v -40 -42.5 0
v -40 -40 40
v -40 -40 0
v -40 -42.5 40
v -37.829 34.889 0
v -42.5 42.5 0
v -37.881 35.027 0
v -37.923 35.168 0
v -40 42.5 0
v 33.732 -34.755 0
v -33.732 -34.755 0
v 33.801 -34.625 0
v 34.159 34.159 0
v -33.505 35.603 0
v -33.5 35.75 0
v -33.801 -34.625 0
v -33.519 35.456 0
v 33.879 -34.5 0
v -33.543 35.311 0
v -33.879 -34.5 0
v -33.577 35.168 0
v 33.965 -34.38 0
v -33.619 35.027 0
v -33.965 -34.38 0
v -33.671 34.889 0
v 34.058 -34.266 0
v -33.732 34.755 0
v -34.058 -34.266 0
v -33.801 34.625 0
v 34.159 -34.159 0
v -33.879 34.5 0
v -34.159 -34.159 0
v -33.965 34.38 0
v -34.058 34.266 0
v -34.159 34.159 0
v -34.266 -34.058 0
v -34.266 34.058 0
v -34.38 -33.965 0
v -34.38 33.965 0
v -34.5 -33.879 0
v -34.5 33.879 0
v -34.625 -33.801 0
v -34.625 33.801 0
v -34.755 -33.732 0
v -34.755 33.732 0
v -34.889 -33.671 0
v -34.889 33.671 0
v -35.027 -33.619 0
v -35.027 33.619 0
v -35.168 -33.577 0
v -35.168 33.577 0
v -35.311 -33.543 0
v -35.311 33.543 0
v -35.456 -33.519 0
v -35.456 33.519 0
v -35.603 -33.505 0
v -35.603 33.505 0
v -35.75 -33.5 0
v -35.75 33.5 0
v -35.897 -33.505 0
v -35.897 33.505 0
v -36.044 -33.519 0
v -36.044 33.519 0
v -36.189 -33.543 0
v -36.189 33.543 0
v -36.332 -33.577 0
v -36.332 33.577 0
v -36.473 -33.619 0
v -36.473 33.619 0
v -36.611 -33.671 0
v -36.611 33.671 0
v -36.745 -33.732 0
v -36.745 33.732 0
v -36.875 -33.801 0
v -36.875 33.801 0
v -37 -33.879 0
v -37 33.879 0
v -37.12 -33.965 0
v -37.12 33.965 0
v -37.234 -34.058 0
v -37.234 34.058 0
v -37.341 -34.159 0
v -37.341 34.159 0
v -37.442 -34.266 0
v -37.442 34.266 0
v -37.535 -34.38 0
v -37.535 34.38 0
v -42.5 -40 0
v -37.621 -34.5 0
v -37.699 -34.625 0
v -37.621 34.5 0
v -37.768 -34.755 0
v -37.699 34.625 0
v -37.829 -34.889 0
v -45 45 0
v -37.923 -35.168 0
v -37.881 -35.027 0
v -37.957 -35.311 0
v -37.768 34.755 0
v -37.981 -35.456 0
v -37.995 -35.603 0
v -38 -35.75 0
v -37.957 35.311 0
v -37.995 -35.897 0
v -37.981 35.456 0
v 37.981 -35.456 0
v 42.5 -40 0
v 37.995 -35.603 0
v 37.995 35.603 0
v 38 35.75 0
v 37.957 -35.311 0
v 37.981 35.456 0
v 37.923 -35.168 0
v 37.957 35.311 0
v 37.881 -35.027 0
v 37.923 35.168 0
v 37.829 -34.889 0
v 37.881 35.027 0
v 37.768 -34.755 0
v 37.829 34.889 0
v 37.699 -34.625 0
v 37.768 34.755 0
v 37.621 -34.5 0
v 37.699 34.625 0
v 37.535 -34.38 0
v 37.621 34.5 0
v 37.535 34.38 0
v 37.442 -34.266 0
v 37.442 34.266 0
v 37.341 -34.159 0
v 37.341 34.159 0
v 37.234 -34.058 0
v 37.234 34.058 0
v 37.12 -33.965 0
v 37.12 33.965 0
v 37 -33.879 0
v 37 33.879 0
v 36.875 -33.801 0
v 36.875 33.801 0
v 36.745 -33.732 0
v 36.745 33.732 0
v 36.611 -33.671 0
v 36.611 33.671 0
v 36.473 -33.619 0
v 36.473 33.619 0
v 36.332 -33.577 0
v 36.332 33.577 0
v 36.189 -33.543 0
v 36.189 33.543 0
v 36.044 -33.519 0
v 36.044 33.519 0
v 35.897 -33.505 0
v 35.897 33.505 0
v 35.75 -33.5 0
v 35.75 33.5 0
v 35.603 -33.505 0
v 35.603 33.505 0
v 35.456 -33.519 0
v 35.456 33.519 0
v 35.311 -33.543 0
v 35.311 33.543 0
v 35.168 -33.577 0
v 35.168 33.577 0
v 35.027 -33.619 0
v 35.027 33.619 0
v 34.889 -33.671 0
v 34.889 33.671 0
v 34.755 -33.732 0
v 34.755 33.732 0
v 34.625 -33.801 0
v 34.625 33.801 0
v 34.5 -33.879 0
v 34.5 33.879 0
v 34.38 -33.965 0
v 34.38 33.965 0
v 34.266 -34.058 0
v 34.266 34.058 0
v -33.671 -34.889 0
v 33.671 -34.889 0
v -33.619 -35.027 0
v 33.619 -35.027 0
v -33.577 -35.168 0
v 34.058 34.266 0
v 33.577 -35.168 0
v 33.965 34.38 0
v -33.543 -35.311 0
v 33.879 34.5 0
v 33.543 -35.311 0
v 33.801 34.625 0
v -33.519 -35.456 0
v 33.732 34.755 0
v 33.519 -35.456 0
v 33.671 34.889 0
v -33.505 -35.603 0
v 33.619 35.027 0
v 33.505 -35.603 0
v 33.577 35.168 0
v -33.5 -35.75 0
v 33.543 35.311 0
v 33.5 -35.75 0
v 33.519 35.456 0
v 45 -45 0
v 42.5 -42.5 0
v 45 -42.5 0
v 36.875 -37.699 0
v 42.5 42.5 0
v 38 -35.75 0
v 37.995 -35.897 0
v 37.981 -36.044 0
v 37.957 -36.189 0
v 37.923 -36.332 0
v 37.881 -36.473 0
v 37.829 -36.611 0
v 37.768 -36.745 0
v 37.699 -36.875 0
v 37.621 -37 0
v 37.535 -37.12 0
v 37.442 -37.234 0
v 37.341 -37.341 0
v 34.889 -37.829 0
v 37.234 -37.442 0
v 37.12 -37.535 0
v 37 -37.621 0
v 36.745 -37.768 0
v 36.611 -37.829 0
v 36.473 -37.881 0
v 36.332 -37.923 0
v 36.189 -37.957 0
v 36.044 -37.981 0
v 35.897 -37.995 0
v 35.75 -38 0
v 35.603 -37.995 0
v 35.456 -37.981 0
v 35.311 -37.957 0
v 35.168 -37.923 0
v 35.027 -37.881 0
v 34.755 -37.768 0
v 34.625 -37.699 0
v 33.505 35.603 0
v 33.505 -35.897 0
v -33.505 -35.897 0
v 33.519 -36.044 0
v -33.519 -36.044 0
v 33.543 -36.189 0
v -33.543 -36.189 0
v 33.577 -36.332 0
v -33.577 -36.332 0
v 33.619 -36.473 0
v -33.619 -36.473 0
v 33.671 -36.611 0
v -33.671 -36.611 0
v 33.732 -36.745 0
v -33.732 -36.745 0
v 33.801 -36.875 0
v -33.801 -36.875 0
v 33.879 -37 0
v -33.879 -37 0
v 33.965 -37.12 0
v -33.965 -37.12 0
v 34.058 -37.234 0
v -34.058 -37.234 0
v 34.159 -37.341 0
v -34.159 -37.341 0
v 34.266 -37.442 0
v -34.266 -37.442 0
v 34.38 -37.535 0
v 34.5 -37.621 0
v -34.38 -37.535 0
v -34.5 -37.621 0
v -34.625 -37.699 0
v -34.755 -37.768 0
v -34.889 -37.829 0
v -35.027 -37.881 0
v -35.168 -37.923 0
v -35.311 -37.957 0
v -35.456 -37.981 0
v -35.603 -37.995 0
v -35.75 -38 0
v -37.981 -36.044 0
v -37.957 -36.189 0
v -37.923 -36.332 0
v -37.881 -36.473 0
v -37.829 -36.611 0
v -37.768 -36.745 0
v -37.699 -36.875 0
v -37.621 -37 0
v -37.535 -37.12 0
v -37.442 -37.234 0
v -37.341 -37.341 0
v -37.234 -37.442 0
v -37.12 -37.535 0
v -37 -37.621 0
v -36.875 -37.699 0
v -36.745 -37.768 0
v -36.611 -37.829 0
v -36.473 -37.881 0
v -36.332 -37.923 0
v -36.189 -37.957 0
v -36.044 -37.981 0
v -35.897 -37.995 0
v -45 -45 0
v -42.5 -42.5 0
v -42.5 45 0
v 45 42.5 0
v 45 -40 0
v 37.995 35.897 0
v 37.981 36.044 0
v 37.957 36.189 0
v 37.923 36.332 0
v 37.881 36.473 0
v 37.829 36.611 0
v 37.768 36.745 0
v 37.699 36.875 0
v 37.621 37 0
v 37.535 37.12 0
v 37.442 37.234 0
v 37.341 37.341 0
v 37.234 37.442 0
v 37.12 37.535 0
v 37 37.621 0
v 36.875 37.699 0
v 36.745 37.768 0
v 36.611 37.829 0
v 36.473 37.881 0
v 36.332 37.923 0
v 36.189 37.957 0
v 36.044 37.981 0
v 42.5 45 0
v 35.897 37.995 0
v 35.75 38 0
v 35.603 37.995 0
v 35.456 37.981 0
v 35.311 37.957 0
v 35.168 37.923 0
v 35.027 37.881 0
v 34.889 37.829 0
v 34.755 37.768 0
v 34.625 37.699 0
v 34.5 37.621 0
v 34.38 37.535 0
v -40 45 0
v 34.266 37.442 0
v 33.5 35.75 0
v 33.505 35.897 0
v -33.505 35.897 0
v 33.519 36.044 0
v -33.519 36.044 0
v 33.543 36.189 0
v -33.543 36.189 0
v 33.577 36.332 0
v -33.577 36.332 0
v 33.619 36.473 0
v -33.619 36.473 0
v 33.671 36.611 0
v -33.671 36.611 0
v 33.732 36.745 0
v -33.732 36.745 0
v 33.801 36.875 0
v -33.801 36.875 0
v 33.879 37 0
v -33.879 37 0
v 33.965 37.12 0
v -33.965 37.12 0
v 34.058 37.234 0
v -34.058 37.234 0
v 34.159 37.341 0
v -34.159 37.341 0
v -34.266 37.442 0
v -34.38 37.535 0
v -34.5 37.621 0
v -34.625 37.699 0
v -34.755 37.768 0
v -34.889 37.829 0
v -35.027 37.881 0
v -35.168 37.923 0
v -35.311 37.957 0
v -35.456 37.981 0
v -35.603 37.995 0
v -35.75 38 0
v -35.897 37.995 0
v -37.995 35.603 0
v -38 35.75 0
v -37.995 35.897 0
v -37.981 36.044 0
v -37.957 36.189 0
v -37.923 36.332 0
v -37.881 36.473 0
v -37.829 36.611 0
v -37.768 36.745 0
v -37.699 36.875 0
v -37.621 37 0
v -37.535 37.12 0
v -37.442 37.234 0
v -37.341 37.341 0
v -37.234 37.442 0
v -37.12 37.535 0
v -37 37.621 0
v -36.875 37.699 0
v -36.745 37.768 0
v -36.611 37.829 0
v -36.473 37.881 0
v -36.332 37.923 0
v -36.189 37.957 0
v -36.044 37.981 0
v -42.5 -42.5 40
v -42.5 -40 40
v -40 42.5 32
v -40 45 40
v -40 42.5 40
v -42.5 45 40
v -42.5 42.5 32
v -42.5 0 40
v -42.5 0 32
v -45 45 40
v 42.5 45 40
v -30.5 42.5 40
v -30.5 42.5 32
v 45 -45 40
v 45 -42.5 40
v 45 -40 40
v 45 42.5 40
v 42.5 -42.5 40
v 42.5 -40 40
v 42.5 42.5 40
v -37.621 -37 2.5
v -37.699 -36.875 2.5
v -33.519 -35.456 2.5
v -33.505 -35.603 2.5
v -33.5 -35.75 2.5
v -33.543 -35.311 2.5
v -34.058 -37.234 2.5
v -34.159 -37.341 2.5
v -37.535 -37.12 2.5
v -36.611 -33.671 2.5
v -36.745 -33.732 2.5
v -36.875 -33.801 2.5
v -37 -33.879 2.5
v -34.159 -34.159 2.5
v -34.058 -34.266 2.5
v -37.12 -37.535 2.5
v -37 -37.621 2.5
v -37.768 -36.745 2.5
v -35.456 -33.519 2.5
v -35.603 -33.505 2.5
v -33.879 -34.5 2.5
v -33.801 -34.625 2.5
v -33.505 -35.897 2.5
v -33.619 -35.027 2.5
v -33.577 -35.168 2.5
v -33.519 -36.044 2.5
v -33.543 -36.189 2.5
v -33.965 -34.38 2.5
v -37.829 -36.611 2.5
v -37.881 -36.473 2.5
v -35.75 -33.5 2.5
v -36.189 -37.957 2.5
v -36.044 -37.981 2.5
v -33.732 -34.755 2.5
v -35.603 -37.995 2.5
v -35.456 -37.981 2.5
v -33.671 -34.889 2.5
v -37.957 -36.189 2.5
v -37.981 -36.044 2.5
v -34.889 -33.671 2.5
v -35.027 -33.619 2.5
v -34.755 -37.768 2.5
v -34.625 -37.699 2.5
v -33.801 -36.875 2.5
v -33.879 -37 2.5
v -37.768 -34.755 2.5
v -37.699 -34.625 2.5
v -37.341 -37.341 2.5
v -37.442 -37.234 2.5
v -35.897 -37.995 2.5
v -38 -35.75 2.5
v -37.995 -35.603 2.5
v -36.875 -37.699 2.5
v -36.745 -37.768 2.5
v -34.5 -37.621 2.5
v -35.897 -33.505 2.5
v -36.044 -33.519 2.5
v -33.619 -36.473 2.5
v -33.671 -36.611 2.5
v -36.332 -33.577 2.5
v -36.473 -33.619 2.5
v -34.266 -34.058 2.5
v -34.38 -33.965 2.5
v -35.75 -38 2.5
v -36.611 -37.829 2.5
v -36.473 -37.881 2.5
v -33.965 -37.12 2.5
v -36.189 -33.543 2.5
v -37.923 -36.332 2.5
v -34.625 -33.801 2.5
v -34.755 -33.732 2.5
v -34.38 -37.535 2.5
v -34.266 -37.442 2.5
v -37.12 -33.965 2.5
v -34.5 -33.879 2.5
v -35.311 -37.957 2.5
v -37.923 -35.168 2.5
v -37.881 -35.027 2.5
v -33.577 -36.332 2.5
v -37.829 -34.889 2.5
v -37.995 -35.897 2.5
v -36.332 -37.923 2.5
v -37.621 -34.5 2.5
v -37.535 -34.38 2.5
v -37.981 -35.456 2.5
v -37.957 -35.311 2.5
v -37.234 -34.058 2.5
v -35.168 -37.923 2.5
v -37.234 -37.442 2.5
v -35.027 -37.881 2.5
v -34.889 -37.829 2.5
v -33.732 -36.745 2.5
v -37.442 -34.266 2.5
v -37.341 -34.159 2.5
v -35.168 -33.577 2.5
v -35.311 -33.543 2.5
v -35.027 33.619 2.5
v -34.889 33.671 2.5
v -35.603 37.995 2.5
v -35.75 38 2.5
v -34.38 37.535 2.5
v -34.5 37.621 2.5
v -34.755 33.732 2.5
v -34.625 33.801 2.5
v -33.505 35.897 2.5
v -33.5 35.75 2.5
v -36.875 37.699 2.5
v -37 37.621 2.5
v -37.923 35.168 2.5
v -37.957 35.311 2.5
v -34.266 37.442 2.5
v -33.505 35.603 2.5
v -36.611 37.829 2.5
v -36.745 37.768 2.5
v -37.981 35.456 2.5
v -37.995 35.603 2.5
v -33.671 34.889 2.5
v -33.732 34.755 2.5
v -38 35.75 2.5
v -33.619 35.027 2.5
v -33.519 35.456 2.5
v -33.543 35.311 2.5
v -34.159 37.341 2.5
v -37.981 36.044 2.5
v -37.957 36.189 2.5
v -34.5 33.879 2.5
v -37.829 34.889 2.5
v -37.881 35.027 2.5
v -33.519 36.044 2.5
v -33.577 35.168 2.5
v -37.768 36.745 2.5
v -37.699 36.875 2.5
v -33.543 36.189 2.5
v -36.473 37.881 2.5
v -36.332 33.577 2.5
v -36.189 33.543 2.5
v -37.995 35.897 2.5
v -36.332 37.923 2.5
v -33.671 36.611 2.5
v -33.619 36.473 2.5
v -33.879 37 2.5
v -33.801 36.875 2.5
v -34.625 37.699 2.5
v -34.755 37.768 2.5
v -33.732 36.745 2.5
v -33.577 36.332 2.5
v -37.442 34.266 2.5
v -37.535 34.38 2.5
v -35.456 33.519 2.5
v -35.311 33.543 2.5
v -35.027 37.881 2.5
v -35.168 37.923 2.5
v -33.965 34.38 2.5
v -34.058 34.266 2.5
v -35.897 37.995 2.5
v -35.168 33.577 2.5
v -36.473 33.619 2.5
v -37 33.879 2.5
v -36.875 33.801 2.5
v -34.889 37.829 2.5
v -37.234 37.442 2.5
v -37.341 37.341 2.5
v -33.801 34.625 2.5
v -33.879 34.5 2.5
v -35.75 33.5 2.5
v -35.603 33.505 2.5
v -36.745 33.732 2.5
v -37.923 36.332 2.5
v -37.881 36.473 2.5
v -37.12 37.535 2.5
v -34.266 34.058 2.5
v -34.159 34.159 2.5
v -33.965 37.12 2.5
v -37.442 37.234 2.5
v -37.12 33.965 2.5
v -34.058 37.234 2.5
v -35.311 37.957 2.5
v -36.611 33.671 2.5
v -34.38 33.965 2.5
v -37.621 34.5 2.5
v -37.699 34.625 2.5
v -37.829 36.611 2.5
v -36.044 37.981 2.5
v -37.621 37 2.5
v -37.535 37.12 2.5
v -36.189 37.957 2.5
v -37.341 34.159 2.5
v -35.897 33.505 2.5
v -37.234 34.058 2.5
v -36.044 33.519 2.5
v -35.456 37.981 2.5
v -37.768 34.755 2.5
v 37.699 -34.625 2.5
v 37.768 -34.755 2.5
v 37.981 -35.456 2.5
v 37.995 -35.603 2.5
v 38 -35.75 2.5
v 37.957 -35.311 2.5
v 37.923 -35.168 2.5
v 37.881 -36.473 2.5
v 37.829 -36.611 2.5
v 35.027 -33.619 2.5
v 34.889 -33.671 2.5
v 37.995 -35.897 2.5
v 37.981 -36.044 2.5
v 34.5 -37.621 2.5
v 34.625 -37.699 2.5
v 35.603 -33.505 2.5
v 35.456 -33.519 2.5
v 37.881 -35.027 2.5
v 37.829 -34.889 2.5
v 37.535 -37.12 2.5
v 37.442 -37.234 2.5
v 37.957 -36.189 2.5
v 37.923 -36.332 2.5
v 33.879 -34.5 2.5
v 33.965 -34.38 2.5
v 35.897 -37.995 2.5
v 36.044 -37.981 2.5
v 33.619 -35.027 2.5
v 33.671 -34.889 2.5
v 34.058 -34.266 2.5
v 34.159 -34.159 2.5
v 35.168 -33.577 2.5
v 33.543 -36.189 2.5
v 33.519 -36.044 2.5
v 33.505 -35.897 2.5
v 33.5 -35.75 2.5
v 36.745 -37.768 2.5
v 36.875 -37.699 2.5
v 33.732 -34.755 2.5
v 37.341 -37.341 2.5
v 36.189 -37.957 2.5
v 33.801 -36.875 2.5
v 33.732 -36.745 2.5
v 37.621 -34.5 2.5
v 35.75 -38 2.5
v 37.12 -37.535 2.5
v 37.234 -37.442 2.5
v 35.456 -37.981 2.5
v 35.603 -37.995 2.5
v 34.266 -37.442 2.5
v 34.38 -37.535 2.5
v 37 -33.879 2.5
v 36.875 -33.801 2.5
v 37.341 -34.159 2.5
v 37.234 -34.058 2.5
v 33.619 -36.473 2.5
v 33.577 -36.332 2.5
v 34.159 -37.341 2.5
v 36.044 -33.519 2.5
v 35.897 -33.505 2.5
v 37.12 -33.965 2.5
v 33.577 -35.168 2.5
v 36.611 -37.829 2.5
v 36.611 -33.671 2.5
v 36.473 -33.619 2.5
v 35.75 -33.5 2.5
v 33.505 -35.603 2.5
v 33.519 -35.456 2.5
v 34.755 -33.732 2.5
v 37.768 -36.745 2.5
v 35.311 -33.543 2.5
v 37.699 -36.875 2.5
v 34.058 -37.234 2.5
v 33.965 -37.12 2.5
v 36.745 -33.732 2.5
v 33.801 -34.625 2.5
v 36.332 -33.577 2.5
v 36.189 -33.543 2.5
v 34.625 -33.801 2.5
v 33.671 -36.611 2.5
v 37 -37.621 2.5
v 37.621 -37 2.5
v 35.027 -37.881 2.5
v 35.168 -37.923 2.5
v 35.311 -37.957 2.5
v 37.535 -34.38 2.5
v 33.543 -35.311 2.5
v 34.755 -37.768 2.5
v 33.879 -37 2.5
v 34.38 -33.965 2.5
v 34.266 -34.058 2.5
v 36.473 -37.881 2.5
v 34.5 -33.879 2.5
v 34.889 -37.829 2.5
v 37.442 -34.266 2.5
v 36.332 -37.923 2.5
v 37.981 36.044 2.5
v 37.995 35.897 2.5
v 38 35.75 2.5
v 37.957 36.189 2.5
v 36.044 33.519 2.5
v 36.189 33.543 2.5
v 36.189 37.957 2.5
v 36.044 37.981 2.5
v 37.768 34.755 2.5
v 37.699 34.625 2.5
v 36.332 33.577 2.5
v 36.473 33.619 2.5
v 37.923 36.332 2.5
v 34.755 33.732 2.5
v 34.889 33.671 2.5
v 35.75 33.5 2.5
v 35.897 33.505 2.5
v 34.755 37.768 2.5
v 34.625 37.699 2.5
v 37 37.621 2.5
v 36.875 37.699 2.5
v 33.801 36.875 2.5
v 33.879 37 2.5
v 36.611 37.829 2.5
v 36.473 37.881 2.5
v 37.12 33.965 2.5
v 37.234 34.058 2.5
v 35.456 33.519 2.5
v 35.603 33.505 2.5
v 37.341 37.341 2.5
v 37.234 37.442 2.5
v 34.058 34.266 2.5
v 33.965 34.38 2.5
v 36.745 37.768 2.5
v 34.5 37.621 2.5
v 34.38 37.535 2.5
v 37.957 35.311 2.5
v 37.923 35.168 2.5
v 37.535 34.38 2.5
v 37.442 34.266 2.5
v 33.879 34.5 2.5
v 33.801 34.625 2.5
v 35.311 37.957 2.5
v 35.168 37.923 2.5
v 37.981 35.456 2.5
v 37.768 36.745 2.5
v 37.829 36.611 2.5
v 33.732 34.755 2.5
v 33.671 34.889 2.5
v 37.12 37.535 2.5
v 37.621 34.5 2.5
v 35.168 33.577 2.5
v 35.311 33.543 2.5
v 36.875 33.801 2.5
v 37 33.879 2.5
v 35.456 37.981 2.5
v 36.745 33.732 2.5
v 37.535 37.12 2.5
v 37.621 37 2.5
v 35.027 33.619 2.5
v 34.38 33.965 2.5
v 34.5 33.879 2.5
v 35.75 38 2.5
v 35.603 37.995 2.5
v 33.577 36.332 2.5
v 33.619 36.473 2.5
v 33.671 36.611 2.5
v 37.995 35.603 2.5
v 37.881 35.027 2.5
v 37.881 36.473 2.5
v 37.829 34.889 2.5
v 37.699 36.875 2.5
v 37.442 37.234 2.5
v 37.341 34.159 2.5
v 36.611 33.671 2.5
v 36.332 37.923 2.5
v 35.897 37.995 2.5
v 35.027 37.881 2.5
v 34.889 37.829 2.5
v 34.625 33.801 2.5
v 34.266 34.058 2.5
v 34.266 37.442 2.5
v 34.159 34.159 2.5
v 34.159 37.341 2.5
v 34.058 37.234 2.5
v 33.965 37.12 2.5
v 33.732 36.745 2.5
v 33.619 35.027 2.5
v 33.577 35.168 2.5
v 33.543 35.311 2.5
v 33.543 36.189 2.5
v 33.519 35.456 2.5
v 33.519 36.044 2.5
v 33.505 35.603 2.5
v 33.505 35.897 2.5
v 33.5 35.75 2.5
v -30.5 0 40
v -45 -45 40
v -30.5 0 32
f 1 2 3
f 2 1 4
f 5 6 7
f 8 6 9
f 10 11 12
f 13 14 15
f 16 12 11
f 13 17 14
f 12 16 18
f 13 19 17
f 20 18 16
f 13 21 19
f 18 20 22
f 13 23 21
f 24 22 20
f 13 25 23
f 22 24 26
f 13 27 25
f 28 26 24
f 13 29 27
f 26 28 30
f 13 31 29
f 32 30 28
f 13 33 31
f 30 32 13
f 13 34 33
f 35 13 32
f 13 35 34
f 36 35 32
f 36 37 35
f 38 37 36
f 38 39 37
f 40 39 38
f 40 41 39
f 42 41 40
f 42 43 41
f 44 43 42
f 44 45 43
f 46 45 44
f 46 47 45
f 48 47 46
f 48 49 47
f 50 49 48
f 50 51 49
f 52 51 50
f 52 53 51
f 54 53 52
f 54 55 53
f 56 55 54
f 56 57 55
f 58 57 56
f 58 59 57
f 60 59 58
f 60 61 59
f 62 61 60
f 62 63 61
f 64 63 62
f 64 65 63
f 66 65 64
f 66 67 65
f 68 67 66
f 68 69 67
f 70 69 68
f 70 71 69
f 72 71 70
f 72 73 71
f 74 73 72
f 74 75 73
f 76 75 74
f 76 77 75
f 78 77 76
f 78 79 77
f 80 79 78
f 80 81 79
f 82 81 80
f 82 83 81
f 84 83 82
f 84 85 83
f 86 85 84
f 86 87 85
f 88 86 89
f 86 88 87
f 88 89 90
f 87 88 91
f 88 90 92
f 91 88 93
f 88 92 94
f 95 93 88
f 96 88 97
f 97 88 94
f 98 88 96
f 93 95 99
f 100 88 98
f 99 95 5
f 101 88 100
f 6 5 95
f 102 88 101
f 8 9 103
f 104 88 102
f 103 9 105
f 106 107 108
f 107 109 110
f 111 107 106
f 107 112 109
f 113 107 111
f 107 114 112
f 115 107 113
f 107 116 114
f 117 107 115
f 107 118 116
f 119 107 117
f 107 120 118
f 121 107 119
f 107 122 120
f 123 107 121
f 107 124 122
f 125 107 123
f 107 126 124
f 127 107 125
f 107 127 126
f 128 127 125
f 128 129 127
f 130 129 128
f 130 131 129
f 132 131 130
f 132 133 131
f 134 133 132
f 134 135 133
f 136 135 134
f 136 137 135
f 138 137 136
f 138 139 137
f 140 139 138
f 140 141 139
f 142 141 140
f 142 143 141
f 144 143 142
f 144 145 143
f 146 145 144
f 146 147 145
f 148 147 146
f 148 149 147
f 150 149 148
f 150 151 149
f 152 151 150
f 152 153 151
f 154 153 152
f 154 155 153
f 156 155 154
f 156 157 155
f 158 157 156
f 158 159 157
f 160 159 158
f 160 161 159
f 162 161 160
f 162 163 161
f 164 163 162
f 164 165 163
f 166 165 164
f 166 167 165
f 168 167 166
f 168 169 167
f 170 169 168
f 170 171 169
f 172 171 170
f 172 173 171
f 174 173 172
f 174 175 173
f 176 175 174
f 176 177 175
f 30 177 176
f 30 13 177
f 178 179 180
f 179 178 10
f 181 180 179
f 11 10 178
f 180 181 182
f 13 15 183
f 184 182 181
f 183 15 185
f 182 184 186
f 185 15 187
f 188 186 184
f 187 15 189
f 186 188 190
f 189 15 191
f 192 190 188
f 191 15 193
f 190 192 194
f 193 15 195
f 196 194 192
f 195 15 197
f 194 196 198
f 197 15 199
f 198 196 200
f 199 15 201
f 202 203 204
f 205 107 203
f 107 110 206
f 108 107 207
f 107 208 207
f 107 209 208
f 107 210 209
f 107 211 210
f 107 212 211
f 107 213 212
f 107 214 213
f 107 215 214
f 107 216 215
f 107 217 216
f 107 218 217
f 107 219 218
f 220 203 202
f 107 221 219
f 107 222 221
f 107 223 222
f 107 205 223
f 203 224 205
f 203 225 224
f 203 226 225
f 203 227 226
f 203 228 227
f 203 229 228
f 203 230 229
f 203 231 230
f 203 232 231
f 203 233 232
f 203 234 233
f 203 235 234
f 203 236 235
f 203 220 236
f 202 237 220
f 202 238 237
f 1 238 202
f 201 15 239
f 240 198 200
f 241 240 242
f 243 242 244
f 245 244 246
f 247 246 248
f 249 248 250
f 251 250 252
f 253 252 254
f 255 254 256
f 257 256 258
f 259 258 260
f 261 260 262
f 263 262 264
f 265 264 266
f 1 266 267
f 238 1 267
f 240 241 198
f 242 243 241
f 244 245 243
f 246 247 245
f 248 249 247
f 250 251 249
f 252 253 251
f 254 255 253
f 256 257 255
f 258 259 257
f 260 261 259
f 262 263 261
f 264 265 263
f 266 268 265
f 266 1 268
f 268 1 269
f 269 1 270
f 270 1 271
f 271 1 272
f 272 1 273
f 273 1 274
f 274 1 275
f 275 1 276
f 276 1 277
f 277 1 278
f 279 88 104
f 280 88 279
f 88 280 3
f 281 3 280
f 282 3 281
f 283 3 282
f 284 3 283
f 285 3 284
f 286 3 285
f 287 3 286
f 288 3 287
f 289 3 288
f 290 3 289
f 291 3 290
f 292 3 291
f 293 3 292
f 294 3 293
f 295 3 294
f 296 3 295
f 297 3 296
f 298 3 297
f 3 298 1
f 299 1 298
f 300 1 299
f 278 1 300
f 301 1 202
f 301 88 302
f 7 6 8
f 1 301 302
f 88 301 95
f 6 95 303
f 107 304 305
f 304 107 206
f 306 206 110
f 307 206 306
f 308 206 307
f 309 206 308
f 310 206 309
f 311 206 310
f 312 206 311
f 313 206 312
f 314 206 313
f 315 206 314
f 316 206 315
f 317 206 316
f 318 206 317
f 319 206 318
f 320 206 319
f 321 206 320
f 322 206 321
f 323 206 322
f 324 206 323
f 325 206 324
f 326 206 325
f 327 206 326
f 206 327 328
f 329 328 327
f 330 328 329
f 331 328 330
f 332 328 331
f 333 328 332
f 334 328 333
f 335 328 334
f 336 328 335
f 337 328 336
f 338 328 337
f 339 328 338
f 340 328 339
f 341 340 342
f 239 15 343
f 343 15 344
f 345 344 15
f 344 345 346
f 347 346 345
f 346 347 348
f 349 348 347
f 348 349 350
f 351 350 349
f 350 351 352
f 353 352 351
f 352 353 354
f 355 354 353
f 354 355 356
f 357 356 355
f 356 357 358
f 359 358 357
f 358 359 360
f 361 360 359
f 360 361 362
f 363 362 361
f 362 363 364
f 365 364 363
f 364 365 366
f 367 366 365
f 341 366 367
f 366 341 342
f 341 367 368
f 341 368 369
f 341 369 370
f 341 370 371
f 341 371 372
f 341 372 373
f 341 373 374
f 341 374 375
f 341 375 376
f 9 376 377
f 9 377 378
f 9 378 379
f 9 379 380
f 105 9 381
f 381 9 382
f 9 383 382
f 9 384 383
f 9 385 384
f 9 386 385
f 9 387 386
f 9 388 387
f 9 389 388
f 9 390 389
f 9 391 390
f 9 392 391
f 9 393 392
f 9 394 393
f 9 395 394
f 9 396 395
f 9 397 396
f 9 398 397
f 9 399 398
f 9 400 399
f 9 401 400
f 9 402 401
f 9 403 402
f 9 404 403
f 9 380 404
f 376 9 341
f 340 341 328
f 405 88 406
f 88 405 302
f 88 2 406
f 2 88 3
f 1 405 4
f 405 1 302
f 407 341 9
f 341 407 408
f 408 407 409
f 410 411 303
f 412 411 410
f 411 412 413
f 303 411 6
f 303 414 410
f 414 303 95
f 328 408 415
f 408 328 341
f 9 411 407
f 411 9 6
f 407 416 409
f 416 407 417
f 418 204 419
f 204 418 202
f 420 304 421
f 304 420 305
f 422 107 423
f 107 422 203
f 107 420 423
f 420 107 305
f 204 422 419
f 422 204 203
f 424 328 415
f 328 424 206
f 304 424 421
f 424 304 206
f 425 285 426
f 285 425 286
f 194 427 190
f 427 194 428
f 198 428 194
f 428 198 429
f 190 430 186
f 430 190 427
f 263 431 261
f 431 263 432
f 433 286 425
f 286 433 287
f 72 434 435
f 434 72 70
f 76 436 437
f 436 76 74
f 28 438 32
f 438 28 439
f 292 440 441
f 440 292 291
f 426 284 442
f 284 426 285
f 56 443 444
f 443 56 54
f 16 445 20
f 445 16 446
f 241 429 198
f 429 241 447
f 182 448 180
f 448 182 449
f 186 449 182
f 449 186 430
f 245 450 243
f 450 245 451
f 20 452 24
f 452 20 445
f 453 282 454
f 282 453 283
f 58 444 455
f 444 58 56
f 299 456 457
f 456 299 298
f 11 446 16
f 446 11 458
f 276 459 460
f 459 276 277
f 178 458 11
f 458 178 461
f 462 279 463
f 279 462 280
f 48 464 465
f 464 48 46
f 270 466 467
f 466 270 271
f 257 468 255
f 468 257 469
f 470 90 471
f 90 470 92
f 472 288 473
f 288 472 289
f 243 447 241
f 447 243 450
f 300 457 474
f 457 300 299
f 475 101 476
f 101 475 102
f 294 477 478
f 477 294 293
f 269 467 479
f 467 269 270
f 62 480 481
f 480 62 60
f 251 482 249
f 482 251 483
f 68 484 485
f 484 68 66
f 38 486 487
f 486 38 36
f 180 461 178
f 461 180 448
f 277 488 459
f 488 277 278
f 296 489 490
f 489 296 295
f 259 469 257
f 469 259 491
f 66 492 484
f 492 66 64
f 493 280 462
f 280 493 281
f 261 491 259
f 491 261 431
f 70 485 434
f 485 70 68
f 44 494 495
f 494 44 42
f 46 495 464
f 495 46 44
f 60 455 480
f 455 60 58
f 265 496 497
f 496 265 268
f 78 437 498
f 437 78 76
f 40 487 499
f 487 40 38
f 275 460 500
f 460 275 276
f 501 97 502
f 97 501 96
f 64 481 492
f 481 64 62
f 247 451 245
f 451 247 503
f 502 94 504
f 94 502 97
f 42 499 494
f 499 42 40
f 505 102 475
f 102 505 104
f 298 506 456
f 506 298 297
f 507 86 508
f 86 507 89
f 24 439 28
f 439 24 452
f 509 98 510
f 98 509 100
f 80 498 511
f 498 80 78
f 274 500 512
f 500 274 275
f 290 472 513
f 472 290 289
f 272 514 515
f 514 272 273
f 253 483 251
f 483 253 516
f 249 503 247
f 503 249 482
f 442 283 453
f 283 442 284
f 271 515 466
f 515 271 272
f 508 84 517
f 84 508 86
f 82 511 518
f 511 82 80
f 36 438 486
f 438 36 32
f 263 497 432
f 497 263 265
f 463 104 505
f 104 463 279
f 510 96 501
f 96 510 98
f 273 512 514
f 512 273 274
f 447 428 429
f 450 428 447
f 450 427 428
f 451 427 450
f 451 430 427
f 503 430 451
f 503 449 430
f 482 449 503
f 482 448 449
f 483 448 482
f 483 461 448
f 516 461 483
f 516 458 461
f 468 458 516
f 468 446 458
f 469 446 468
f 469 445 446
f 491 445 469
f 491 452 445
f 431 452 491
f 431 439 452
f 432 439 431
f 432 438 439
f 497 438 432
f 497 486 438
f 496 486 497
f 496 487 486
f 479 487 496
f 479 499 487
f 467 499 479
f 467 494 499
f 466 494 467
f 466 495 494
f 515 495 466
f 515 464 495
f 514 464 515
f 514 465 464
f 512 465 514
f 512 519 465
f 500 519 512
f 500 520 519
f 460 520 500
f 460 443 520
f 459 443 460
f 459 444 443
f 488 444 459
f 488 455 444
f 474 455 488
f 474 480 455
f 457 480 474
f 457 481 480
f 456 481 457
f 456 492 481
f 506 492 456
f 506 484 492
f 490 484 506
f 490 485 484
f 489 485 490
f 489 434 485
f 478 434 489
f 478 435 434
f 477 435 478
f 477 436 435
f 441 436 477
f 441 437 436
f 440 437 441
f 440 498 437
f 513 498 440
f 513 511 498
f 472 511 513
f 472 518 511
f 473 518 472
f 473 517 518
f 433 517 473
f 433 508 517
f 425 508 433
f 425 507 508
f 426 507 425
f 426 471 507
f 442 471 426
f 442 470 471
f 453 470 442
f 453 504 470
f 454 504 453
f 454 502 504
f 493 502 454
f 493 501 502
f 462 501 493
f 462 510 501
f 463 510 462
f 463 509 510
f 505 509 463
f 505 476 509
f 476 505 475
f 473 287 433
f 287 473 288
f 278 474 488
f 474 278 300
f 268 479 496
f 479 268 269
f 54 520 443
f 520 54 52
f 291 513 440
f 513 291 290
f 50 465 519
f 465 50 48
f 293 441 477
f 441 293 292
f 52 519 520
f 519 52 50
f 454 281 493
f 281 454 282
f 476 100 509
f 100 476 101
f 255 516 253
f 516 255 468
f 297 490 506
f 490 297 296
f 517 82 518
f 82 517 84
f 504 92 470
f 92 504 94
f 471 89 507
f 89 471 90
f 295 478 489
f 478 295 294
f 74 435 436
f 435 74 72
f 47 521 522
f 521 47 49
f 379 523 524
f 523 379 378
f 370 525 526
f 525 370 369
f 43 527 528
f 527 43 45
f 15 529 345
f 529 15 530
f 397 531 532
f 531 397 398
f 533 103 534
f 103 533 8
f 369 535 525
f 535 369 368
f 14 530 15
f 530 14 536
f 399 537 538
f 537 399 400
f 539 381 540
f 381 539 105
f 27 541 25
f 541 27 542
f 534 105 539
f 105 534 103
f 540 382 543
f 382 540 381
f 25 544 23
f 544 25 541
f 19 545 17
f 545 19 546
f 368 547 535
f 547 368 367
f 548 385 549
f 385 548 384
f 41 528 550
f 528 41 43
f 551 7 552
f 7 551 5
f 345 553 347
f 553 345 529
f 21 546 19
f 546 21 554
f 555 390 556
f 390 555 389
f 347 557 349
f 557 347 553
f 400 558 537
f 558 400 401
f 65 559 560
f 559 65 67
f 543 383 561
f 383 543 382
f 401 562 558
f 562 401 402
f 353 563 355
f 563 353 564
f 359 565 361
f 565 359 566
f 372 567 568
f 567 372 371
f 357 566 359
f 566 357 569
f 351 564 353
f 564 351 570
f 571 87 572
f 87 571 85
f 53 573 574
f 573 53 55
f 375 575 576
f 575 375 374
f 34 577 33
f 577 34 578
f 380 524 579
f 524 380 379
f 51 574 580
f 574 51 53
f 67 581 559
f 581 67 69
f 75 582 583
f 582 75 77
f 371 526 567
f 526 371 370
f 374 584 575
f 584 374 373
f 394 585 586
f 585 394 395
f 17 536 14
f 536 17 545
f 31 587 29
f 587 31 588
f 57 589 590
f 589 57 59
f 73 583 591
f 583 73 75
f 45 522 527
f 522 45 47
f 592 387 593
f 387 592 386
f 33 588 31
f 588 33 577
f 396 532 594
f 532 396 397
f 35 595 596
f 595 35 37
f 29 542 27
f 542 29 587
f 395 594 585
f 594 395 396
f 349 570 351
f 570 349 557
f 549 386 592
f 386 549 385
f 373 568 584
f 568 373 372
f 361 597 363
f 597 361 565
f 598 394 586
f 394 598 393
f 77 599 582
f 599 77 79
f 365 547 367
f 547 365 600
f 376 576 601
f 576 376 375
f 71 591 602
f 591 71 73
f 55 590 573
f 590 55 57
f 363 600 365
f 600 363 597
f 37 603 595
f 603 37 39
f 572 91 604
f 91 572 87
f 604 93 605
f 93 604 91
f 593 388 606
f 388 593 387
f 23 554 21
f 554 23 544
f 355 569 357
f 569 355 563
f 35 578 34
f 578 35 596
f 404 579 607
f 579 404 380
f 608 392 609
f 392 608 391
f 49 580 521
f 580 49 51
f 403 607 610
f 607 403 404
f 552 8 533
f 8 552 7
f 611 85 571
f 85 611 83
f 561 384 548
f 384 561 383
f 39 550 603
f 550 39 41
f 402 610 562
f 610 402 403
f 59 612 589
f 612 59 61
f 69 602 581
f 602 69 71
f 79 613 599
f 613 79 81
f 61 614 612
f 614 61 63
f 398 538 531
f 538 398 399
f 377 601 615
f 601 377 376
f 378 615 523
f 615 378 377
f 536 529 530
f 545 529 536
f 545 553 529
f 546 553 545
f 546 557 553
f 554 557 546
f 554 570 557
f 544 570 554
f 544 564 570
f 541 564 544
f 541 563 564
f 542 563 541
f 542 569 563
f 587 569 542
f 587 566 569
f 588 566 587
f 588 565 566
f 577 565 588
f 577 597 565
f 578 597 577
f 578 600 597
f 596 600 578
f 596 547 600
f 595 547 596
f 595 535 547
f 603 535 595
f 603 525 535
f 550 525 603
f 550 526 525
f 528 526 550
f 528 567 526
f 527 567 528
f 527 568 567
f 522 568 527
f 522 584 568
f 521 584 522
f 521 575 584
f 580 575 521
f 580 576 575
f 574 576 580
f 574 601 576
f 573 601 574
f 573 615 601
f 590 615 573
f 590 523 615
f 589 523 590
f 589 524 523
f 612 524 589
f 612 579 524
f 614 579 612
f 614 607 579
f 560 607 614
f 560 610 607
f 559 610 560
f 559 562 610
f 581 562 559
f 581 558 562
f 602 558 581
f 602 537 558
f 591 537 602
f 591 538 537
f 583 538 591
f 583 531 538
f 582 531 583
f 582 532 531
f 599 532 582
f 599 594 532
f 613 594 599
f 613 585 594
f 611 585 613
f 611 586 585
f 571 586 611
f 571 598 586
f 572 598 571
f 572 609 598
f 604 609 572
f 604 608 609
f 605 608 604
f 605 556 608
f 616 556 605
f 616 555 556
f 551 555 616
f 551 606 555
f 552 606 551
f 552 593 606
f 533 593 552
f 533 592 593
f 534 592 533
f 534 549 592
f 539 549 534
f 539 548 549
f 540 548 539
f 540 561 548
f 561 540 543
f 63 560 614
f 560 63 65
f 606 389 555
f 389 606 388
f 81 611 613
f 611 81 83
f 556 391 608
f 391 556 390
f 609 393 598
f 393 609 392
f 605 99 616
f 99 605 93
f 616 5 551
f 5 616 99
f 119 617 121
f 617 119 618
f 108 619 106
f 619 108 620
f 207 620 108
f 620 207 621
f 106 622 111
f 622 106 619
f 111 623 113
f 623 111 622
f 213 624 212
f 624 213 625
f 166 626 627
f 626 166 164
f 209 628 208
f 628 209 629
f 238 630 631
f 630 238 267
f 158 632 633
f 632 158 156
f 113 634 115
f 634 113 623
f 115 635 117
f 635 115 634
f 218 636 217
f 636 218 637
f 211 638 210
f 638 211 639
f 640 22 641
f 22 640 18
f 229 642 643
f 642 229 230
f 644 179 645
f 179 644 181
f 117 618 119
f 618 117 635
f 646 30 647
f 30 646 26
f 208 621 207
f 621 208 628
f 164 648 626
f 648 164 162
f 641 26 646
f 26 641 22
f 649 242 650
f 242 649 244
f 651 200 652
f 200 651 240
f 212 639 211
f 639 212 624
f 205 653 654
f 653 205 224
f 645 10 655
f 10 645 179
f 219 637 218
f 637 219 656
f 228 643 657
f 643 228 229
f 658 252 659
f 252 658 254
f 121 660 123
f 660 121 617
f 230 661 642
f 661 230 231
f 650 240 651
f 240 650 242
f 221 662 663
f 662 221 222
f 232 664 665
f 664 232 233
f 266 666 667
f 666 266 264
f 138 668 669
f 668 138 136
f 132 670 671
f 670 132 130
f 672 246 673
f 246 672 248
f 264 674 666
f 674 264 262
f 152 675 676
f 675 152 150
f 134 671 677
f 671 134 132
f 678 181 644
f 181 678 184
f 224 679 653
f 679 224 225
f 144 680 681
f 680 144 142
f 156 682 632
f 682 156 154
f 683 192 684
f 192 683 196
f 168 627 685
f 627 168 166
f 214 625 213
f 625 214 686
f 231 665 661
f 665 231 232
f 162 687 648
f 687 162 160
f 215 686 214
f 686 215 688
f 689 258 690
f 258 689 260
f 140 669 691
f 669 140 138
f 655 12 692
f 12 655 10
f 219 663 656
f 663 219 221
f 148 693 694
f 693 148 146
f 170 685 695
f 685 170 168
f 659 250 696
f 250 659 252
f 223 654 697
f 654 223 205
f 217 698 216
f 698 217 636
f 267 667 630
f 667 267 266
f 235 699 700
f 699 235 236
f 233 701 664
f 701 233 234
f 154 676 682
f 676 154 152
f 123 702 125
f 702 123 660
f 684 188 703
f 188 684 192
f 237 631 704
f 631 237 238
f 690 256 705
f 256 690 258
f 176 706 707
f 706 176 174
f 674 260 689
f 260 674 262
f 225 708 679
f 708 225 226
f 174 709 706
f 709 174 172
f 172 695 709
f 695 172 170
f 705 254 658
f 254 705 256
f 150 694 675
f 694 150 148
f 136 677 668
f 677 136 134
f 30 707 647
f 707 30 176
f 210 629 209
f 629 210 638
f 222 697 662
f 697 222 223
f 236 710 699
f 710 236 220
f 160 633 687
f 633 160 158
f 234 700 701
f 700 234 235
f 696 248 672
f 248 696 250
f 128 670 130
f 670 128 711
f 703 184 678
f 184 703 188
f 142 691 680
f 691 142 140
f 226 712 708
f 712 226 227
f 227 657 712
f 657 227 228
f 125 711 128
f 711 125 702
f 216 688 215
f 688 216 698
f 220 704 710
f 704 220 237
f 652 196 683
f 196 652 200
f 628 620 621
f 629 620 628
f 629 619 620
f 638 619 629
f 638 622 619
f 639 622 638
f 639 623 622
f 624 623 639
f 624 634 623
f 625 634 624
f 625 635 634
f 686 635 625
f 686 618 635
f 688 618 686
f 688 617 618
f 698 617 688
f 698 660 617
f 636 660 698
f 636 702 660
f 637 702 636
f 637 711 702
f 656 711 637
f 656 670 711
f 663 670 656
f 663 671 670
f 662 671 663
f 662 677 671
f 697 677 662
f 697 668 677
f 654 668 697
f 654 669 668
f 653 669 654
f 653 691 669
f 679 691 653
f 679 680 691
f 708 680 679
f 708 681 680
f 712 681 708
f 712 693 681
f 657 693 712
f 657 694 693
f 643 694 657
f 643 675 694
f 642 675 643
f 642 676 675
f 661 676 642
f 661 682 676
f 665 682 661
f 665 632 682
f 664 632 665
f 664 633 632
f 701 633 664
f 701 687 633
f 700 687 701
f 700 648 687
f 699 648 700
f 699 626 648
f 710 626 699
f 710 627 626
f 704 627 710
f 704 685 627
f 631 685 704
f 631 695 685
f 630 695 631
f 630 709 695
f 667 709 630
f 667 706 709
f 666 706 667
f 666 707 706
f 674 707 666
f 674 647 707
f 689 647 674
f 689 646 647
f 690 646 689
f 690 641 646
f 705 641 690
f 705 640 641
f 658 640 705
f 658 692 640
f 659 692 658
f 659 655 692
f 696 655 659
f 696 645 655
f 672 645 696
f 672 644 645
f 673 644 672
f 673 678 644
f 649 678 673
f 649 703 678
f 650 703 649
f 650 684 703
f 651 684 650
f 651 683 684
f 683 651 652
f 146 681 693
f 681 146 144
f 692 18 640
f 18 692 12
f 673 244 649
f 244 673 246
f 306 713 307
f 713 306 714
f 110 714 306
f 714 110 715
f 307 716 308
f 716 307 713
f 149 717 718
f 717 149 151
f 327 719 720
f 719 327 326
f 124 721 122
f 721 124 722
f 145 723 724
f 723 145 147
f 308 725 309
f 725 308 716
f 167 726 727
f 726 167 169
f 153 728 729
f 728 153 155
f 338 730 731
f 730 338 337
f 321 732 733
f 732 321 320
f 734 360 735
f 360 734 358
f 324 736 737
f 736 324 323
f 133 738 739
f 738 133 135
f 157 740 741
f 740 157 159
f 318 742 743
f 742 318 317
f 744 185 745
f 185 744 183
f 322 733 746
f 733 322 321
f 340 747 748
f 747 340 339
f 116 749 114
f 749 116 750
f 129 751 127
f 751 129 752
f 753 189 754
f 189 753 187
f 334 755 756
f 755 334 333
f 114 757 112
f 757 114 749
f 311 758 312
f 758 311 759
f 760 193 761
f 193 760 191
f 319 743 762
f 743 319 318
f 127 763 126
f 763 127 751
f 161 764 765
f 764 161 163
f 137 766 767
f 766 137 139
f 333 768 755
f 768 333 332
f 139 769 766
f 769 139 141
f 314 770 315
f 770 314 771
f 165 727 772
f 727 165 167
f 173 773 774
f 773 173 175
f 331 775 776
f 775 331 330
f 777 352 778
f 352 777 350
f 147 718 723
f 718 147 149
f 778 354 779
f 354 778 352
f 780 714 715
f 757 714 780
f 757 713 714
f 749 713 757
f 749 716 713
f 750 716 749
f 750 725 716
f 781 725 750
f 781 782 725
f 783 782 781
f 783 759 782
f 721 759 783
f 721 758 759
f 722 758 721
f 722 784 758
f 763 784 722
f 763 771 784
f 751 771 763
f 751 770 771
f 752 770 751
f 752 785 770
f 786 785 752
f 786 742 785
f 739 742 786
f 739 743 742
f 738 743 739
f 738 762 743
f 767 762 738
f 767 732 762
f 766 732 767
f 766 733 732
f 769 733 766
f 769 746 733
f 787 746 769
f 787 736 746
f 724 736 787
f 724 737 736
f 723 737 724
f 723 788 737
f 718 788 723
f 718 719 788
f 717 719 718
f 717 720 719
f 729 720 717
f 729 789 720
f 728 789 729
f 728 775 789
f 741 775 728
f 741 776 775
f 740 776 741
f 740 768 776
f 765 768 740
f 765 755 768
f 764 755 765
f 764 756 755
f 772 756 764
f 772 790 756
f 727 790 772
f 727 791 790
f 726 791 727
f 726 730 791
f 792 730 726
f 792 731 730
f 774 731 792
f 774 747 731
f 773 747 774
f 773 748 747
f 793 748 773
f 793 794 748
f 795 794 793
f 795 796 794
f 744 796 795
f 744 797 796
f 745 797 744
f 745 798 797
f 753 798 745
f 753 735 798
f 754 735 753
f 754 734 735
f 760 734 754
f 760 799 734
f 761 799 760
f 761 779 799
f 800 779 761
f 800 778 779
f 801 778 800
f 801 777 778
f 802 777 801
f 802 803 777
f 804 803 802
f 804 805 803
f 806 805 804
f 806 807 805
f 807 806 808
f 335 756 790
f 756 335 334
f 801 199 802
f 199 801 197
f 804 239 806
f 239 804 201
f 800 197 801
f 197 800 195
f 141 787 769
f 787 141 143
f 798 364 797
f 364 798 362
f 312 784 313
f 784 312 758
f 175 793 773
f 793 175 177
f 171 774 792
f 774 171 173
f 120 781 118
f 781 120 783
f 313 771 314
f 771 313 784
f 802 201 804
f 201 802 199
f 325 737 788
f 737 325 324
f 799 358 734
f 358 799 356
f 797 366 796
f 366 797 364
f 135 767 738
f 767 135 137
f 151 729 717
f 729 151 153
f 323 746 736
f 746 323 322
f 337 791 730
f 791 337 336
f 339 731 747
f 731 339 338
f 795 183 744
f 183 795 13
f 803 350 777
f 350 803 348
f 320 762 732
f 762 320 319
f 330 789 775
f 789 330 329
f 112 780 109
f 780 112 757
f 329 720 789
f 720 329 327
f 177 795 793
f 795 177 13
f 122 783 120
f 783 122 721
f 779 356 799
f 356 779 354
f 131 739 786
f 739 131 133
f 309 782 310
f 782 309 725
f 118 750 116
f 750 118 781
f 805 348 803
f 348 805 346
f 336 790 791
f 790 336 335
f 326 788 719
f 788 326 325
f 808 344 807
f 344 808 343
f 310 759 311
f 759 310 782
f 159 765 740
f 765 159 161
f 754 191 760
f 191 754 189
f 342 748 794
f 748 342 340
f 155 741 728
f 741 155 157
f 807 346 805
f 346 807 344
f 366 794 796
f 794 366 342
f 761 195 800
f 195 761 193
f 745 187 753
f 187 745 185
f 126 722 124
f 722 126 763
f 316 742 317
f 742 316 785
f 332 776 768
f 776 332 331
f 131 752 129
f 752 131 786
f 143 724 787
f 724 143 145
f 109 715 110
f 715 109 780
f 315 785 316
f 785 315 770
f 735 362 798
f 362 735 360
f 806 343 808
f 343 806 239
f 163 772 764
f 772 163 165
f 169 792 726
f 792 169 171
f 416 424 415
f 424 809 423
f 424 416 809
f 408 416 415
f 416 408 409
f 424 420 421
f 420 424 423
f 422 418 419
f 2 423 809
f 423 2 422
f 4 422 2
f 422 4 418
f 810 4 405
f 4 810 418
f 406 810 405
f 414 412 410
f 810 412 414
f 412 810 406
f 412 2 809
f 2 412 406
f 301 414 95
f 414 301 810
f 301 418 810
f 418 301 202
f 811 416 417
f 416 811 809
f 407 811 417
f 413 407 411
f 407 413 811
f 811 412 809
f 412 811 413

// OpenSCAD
// DIY magnetic stirrer housing for an 80 mm PC case fan
// Print orientation: upside-down open box, top plate on the bed

// ---------- Dimensions (mm) ----------
box_outer_x     = 90;    // outer length in X
box_outer_y     = 90;    // outer width in Y
top_plate_t     = 2;     // top plate thickness (z = 0 to 2)
wall_t          = 2.5;   // wall thickness (z = 2 to 40)
open_top_z      = 40;    // open top edge height
screw_hole_d    = 4.5;   // M4 screw hole diameter
screw_hole_pitch = 71.5; // square pitch of screw holes
notch_w         = 12;    // cable notch width
notch_depth     = 8;     // notch depth from open edge (z = 32 to 40)
eps             = 0.5;   // cutter overshoot past faces

$fn = 96;

// ---------- Model ----------
difference() {
    // Solid box: top plate + four walls, open at the top
    translate([-box_outer_x/2, -box_outer_y/2, 0])
        cube([box_outer_x, box_outer_y, open_top_z]);

    // Four through-cut walls, leaving the open top edge
    for (dx = [-box_outer_x/2 + wall_t, box_outer_x/2 - wall_t],
         dy = [-box_outer_y/2 + wall_t, box_outer_y/2 - wall_t])
        translate([dx, dy, 0])
            cube([wall_t, wall_t, open_top_z + eps]);

    // M4 screw holes in the top plate, centred square pattern
    for (x = [-screw_hole_pitch/2, screw_hole_pitch/2])
        for (y = [-screw_hole_pitch/2, screw_hole_pitch/2])
            translate([x, y, -eps])
                cylinder(d = screw_hole_d, h = top_plate_t + 2*eps);

    // Cable notch in one wall: centred along the wall, open to the edge
    translate([-box_outer_x/2 + wall_t, 0, open_top_z - notch_depth])
        cube([notch_w, box_outer_y/2 - wall_t, notch_depth + eps]);
}
